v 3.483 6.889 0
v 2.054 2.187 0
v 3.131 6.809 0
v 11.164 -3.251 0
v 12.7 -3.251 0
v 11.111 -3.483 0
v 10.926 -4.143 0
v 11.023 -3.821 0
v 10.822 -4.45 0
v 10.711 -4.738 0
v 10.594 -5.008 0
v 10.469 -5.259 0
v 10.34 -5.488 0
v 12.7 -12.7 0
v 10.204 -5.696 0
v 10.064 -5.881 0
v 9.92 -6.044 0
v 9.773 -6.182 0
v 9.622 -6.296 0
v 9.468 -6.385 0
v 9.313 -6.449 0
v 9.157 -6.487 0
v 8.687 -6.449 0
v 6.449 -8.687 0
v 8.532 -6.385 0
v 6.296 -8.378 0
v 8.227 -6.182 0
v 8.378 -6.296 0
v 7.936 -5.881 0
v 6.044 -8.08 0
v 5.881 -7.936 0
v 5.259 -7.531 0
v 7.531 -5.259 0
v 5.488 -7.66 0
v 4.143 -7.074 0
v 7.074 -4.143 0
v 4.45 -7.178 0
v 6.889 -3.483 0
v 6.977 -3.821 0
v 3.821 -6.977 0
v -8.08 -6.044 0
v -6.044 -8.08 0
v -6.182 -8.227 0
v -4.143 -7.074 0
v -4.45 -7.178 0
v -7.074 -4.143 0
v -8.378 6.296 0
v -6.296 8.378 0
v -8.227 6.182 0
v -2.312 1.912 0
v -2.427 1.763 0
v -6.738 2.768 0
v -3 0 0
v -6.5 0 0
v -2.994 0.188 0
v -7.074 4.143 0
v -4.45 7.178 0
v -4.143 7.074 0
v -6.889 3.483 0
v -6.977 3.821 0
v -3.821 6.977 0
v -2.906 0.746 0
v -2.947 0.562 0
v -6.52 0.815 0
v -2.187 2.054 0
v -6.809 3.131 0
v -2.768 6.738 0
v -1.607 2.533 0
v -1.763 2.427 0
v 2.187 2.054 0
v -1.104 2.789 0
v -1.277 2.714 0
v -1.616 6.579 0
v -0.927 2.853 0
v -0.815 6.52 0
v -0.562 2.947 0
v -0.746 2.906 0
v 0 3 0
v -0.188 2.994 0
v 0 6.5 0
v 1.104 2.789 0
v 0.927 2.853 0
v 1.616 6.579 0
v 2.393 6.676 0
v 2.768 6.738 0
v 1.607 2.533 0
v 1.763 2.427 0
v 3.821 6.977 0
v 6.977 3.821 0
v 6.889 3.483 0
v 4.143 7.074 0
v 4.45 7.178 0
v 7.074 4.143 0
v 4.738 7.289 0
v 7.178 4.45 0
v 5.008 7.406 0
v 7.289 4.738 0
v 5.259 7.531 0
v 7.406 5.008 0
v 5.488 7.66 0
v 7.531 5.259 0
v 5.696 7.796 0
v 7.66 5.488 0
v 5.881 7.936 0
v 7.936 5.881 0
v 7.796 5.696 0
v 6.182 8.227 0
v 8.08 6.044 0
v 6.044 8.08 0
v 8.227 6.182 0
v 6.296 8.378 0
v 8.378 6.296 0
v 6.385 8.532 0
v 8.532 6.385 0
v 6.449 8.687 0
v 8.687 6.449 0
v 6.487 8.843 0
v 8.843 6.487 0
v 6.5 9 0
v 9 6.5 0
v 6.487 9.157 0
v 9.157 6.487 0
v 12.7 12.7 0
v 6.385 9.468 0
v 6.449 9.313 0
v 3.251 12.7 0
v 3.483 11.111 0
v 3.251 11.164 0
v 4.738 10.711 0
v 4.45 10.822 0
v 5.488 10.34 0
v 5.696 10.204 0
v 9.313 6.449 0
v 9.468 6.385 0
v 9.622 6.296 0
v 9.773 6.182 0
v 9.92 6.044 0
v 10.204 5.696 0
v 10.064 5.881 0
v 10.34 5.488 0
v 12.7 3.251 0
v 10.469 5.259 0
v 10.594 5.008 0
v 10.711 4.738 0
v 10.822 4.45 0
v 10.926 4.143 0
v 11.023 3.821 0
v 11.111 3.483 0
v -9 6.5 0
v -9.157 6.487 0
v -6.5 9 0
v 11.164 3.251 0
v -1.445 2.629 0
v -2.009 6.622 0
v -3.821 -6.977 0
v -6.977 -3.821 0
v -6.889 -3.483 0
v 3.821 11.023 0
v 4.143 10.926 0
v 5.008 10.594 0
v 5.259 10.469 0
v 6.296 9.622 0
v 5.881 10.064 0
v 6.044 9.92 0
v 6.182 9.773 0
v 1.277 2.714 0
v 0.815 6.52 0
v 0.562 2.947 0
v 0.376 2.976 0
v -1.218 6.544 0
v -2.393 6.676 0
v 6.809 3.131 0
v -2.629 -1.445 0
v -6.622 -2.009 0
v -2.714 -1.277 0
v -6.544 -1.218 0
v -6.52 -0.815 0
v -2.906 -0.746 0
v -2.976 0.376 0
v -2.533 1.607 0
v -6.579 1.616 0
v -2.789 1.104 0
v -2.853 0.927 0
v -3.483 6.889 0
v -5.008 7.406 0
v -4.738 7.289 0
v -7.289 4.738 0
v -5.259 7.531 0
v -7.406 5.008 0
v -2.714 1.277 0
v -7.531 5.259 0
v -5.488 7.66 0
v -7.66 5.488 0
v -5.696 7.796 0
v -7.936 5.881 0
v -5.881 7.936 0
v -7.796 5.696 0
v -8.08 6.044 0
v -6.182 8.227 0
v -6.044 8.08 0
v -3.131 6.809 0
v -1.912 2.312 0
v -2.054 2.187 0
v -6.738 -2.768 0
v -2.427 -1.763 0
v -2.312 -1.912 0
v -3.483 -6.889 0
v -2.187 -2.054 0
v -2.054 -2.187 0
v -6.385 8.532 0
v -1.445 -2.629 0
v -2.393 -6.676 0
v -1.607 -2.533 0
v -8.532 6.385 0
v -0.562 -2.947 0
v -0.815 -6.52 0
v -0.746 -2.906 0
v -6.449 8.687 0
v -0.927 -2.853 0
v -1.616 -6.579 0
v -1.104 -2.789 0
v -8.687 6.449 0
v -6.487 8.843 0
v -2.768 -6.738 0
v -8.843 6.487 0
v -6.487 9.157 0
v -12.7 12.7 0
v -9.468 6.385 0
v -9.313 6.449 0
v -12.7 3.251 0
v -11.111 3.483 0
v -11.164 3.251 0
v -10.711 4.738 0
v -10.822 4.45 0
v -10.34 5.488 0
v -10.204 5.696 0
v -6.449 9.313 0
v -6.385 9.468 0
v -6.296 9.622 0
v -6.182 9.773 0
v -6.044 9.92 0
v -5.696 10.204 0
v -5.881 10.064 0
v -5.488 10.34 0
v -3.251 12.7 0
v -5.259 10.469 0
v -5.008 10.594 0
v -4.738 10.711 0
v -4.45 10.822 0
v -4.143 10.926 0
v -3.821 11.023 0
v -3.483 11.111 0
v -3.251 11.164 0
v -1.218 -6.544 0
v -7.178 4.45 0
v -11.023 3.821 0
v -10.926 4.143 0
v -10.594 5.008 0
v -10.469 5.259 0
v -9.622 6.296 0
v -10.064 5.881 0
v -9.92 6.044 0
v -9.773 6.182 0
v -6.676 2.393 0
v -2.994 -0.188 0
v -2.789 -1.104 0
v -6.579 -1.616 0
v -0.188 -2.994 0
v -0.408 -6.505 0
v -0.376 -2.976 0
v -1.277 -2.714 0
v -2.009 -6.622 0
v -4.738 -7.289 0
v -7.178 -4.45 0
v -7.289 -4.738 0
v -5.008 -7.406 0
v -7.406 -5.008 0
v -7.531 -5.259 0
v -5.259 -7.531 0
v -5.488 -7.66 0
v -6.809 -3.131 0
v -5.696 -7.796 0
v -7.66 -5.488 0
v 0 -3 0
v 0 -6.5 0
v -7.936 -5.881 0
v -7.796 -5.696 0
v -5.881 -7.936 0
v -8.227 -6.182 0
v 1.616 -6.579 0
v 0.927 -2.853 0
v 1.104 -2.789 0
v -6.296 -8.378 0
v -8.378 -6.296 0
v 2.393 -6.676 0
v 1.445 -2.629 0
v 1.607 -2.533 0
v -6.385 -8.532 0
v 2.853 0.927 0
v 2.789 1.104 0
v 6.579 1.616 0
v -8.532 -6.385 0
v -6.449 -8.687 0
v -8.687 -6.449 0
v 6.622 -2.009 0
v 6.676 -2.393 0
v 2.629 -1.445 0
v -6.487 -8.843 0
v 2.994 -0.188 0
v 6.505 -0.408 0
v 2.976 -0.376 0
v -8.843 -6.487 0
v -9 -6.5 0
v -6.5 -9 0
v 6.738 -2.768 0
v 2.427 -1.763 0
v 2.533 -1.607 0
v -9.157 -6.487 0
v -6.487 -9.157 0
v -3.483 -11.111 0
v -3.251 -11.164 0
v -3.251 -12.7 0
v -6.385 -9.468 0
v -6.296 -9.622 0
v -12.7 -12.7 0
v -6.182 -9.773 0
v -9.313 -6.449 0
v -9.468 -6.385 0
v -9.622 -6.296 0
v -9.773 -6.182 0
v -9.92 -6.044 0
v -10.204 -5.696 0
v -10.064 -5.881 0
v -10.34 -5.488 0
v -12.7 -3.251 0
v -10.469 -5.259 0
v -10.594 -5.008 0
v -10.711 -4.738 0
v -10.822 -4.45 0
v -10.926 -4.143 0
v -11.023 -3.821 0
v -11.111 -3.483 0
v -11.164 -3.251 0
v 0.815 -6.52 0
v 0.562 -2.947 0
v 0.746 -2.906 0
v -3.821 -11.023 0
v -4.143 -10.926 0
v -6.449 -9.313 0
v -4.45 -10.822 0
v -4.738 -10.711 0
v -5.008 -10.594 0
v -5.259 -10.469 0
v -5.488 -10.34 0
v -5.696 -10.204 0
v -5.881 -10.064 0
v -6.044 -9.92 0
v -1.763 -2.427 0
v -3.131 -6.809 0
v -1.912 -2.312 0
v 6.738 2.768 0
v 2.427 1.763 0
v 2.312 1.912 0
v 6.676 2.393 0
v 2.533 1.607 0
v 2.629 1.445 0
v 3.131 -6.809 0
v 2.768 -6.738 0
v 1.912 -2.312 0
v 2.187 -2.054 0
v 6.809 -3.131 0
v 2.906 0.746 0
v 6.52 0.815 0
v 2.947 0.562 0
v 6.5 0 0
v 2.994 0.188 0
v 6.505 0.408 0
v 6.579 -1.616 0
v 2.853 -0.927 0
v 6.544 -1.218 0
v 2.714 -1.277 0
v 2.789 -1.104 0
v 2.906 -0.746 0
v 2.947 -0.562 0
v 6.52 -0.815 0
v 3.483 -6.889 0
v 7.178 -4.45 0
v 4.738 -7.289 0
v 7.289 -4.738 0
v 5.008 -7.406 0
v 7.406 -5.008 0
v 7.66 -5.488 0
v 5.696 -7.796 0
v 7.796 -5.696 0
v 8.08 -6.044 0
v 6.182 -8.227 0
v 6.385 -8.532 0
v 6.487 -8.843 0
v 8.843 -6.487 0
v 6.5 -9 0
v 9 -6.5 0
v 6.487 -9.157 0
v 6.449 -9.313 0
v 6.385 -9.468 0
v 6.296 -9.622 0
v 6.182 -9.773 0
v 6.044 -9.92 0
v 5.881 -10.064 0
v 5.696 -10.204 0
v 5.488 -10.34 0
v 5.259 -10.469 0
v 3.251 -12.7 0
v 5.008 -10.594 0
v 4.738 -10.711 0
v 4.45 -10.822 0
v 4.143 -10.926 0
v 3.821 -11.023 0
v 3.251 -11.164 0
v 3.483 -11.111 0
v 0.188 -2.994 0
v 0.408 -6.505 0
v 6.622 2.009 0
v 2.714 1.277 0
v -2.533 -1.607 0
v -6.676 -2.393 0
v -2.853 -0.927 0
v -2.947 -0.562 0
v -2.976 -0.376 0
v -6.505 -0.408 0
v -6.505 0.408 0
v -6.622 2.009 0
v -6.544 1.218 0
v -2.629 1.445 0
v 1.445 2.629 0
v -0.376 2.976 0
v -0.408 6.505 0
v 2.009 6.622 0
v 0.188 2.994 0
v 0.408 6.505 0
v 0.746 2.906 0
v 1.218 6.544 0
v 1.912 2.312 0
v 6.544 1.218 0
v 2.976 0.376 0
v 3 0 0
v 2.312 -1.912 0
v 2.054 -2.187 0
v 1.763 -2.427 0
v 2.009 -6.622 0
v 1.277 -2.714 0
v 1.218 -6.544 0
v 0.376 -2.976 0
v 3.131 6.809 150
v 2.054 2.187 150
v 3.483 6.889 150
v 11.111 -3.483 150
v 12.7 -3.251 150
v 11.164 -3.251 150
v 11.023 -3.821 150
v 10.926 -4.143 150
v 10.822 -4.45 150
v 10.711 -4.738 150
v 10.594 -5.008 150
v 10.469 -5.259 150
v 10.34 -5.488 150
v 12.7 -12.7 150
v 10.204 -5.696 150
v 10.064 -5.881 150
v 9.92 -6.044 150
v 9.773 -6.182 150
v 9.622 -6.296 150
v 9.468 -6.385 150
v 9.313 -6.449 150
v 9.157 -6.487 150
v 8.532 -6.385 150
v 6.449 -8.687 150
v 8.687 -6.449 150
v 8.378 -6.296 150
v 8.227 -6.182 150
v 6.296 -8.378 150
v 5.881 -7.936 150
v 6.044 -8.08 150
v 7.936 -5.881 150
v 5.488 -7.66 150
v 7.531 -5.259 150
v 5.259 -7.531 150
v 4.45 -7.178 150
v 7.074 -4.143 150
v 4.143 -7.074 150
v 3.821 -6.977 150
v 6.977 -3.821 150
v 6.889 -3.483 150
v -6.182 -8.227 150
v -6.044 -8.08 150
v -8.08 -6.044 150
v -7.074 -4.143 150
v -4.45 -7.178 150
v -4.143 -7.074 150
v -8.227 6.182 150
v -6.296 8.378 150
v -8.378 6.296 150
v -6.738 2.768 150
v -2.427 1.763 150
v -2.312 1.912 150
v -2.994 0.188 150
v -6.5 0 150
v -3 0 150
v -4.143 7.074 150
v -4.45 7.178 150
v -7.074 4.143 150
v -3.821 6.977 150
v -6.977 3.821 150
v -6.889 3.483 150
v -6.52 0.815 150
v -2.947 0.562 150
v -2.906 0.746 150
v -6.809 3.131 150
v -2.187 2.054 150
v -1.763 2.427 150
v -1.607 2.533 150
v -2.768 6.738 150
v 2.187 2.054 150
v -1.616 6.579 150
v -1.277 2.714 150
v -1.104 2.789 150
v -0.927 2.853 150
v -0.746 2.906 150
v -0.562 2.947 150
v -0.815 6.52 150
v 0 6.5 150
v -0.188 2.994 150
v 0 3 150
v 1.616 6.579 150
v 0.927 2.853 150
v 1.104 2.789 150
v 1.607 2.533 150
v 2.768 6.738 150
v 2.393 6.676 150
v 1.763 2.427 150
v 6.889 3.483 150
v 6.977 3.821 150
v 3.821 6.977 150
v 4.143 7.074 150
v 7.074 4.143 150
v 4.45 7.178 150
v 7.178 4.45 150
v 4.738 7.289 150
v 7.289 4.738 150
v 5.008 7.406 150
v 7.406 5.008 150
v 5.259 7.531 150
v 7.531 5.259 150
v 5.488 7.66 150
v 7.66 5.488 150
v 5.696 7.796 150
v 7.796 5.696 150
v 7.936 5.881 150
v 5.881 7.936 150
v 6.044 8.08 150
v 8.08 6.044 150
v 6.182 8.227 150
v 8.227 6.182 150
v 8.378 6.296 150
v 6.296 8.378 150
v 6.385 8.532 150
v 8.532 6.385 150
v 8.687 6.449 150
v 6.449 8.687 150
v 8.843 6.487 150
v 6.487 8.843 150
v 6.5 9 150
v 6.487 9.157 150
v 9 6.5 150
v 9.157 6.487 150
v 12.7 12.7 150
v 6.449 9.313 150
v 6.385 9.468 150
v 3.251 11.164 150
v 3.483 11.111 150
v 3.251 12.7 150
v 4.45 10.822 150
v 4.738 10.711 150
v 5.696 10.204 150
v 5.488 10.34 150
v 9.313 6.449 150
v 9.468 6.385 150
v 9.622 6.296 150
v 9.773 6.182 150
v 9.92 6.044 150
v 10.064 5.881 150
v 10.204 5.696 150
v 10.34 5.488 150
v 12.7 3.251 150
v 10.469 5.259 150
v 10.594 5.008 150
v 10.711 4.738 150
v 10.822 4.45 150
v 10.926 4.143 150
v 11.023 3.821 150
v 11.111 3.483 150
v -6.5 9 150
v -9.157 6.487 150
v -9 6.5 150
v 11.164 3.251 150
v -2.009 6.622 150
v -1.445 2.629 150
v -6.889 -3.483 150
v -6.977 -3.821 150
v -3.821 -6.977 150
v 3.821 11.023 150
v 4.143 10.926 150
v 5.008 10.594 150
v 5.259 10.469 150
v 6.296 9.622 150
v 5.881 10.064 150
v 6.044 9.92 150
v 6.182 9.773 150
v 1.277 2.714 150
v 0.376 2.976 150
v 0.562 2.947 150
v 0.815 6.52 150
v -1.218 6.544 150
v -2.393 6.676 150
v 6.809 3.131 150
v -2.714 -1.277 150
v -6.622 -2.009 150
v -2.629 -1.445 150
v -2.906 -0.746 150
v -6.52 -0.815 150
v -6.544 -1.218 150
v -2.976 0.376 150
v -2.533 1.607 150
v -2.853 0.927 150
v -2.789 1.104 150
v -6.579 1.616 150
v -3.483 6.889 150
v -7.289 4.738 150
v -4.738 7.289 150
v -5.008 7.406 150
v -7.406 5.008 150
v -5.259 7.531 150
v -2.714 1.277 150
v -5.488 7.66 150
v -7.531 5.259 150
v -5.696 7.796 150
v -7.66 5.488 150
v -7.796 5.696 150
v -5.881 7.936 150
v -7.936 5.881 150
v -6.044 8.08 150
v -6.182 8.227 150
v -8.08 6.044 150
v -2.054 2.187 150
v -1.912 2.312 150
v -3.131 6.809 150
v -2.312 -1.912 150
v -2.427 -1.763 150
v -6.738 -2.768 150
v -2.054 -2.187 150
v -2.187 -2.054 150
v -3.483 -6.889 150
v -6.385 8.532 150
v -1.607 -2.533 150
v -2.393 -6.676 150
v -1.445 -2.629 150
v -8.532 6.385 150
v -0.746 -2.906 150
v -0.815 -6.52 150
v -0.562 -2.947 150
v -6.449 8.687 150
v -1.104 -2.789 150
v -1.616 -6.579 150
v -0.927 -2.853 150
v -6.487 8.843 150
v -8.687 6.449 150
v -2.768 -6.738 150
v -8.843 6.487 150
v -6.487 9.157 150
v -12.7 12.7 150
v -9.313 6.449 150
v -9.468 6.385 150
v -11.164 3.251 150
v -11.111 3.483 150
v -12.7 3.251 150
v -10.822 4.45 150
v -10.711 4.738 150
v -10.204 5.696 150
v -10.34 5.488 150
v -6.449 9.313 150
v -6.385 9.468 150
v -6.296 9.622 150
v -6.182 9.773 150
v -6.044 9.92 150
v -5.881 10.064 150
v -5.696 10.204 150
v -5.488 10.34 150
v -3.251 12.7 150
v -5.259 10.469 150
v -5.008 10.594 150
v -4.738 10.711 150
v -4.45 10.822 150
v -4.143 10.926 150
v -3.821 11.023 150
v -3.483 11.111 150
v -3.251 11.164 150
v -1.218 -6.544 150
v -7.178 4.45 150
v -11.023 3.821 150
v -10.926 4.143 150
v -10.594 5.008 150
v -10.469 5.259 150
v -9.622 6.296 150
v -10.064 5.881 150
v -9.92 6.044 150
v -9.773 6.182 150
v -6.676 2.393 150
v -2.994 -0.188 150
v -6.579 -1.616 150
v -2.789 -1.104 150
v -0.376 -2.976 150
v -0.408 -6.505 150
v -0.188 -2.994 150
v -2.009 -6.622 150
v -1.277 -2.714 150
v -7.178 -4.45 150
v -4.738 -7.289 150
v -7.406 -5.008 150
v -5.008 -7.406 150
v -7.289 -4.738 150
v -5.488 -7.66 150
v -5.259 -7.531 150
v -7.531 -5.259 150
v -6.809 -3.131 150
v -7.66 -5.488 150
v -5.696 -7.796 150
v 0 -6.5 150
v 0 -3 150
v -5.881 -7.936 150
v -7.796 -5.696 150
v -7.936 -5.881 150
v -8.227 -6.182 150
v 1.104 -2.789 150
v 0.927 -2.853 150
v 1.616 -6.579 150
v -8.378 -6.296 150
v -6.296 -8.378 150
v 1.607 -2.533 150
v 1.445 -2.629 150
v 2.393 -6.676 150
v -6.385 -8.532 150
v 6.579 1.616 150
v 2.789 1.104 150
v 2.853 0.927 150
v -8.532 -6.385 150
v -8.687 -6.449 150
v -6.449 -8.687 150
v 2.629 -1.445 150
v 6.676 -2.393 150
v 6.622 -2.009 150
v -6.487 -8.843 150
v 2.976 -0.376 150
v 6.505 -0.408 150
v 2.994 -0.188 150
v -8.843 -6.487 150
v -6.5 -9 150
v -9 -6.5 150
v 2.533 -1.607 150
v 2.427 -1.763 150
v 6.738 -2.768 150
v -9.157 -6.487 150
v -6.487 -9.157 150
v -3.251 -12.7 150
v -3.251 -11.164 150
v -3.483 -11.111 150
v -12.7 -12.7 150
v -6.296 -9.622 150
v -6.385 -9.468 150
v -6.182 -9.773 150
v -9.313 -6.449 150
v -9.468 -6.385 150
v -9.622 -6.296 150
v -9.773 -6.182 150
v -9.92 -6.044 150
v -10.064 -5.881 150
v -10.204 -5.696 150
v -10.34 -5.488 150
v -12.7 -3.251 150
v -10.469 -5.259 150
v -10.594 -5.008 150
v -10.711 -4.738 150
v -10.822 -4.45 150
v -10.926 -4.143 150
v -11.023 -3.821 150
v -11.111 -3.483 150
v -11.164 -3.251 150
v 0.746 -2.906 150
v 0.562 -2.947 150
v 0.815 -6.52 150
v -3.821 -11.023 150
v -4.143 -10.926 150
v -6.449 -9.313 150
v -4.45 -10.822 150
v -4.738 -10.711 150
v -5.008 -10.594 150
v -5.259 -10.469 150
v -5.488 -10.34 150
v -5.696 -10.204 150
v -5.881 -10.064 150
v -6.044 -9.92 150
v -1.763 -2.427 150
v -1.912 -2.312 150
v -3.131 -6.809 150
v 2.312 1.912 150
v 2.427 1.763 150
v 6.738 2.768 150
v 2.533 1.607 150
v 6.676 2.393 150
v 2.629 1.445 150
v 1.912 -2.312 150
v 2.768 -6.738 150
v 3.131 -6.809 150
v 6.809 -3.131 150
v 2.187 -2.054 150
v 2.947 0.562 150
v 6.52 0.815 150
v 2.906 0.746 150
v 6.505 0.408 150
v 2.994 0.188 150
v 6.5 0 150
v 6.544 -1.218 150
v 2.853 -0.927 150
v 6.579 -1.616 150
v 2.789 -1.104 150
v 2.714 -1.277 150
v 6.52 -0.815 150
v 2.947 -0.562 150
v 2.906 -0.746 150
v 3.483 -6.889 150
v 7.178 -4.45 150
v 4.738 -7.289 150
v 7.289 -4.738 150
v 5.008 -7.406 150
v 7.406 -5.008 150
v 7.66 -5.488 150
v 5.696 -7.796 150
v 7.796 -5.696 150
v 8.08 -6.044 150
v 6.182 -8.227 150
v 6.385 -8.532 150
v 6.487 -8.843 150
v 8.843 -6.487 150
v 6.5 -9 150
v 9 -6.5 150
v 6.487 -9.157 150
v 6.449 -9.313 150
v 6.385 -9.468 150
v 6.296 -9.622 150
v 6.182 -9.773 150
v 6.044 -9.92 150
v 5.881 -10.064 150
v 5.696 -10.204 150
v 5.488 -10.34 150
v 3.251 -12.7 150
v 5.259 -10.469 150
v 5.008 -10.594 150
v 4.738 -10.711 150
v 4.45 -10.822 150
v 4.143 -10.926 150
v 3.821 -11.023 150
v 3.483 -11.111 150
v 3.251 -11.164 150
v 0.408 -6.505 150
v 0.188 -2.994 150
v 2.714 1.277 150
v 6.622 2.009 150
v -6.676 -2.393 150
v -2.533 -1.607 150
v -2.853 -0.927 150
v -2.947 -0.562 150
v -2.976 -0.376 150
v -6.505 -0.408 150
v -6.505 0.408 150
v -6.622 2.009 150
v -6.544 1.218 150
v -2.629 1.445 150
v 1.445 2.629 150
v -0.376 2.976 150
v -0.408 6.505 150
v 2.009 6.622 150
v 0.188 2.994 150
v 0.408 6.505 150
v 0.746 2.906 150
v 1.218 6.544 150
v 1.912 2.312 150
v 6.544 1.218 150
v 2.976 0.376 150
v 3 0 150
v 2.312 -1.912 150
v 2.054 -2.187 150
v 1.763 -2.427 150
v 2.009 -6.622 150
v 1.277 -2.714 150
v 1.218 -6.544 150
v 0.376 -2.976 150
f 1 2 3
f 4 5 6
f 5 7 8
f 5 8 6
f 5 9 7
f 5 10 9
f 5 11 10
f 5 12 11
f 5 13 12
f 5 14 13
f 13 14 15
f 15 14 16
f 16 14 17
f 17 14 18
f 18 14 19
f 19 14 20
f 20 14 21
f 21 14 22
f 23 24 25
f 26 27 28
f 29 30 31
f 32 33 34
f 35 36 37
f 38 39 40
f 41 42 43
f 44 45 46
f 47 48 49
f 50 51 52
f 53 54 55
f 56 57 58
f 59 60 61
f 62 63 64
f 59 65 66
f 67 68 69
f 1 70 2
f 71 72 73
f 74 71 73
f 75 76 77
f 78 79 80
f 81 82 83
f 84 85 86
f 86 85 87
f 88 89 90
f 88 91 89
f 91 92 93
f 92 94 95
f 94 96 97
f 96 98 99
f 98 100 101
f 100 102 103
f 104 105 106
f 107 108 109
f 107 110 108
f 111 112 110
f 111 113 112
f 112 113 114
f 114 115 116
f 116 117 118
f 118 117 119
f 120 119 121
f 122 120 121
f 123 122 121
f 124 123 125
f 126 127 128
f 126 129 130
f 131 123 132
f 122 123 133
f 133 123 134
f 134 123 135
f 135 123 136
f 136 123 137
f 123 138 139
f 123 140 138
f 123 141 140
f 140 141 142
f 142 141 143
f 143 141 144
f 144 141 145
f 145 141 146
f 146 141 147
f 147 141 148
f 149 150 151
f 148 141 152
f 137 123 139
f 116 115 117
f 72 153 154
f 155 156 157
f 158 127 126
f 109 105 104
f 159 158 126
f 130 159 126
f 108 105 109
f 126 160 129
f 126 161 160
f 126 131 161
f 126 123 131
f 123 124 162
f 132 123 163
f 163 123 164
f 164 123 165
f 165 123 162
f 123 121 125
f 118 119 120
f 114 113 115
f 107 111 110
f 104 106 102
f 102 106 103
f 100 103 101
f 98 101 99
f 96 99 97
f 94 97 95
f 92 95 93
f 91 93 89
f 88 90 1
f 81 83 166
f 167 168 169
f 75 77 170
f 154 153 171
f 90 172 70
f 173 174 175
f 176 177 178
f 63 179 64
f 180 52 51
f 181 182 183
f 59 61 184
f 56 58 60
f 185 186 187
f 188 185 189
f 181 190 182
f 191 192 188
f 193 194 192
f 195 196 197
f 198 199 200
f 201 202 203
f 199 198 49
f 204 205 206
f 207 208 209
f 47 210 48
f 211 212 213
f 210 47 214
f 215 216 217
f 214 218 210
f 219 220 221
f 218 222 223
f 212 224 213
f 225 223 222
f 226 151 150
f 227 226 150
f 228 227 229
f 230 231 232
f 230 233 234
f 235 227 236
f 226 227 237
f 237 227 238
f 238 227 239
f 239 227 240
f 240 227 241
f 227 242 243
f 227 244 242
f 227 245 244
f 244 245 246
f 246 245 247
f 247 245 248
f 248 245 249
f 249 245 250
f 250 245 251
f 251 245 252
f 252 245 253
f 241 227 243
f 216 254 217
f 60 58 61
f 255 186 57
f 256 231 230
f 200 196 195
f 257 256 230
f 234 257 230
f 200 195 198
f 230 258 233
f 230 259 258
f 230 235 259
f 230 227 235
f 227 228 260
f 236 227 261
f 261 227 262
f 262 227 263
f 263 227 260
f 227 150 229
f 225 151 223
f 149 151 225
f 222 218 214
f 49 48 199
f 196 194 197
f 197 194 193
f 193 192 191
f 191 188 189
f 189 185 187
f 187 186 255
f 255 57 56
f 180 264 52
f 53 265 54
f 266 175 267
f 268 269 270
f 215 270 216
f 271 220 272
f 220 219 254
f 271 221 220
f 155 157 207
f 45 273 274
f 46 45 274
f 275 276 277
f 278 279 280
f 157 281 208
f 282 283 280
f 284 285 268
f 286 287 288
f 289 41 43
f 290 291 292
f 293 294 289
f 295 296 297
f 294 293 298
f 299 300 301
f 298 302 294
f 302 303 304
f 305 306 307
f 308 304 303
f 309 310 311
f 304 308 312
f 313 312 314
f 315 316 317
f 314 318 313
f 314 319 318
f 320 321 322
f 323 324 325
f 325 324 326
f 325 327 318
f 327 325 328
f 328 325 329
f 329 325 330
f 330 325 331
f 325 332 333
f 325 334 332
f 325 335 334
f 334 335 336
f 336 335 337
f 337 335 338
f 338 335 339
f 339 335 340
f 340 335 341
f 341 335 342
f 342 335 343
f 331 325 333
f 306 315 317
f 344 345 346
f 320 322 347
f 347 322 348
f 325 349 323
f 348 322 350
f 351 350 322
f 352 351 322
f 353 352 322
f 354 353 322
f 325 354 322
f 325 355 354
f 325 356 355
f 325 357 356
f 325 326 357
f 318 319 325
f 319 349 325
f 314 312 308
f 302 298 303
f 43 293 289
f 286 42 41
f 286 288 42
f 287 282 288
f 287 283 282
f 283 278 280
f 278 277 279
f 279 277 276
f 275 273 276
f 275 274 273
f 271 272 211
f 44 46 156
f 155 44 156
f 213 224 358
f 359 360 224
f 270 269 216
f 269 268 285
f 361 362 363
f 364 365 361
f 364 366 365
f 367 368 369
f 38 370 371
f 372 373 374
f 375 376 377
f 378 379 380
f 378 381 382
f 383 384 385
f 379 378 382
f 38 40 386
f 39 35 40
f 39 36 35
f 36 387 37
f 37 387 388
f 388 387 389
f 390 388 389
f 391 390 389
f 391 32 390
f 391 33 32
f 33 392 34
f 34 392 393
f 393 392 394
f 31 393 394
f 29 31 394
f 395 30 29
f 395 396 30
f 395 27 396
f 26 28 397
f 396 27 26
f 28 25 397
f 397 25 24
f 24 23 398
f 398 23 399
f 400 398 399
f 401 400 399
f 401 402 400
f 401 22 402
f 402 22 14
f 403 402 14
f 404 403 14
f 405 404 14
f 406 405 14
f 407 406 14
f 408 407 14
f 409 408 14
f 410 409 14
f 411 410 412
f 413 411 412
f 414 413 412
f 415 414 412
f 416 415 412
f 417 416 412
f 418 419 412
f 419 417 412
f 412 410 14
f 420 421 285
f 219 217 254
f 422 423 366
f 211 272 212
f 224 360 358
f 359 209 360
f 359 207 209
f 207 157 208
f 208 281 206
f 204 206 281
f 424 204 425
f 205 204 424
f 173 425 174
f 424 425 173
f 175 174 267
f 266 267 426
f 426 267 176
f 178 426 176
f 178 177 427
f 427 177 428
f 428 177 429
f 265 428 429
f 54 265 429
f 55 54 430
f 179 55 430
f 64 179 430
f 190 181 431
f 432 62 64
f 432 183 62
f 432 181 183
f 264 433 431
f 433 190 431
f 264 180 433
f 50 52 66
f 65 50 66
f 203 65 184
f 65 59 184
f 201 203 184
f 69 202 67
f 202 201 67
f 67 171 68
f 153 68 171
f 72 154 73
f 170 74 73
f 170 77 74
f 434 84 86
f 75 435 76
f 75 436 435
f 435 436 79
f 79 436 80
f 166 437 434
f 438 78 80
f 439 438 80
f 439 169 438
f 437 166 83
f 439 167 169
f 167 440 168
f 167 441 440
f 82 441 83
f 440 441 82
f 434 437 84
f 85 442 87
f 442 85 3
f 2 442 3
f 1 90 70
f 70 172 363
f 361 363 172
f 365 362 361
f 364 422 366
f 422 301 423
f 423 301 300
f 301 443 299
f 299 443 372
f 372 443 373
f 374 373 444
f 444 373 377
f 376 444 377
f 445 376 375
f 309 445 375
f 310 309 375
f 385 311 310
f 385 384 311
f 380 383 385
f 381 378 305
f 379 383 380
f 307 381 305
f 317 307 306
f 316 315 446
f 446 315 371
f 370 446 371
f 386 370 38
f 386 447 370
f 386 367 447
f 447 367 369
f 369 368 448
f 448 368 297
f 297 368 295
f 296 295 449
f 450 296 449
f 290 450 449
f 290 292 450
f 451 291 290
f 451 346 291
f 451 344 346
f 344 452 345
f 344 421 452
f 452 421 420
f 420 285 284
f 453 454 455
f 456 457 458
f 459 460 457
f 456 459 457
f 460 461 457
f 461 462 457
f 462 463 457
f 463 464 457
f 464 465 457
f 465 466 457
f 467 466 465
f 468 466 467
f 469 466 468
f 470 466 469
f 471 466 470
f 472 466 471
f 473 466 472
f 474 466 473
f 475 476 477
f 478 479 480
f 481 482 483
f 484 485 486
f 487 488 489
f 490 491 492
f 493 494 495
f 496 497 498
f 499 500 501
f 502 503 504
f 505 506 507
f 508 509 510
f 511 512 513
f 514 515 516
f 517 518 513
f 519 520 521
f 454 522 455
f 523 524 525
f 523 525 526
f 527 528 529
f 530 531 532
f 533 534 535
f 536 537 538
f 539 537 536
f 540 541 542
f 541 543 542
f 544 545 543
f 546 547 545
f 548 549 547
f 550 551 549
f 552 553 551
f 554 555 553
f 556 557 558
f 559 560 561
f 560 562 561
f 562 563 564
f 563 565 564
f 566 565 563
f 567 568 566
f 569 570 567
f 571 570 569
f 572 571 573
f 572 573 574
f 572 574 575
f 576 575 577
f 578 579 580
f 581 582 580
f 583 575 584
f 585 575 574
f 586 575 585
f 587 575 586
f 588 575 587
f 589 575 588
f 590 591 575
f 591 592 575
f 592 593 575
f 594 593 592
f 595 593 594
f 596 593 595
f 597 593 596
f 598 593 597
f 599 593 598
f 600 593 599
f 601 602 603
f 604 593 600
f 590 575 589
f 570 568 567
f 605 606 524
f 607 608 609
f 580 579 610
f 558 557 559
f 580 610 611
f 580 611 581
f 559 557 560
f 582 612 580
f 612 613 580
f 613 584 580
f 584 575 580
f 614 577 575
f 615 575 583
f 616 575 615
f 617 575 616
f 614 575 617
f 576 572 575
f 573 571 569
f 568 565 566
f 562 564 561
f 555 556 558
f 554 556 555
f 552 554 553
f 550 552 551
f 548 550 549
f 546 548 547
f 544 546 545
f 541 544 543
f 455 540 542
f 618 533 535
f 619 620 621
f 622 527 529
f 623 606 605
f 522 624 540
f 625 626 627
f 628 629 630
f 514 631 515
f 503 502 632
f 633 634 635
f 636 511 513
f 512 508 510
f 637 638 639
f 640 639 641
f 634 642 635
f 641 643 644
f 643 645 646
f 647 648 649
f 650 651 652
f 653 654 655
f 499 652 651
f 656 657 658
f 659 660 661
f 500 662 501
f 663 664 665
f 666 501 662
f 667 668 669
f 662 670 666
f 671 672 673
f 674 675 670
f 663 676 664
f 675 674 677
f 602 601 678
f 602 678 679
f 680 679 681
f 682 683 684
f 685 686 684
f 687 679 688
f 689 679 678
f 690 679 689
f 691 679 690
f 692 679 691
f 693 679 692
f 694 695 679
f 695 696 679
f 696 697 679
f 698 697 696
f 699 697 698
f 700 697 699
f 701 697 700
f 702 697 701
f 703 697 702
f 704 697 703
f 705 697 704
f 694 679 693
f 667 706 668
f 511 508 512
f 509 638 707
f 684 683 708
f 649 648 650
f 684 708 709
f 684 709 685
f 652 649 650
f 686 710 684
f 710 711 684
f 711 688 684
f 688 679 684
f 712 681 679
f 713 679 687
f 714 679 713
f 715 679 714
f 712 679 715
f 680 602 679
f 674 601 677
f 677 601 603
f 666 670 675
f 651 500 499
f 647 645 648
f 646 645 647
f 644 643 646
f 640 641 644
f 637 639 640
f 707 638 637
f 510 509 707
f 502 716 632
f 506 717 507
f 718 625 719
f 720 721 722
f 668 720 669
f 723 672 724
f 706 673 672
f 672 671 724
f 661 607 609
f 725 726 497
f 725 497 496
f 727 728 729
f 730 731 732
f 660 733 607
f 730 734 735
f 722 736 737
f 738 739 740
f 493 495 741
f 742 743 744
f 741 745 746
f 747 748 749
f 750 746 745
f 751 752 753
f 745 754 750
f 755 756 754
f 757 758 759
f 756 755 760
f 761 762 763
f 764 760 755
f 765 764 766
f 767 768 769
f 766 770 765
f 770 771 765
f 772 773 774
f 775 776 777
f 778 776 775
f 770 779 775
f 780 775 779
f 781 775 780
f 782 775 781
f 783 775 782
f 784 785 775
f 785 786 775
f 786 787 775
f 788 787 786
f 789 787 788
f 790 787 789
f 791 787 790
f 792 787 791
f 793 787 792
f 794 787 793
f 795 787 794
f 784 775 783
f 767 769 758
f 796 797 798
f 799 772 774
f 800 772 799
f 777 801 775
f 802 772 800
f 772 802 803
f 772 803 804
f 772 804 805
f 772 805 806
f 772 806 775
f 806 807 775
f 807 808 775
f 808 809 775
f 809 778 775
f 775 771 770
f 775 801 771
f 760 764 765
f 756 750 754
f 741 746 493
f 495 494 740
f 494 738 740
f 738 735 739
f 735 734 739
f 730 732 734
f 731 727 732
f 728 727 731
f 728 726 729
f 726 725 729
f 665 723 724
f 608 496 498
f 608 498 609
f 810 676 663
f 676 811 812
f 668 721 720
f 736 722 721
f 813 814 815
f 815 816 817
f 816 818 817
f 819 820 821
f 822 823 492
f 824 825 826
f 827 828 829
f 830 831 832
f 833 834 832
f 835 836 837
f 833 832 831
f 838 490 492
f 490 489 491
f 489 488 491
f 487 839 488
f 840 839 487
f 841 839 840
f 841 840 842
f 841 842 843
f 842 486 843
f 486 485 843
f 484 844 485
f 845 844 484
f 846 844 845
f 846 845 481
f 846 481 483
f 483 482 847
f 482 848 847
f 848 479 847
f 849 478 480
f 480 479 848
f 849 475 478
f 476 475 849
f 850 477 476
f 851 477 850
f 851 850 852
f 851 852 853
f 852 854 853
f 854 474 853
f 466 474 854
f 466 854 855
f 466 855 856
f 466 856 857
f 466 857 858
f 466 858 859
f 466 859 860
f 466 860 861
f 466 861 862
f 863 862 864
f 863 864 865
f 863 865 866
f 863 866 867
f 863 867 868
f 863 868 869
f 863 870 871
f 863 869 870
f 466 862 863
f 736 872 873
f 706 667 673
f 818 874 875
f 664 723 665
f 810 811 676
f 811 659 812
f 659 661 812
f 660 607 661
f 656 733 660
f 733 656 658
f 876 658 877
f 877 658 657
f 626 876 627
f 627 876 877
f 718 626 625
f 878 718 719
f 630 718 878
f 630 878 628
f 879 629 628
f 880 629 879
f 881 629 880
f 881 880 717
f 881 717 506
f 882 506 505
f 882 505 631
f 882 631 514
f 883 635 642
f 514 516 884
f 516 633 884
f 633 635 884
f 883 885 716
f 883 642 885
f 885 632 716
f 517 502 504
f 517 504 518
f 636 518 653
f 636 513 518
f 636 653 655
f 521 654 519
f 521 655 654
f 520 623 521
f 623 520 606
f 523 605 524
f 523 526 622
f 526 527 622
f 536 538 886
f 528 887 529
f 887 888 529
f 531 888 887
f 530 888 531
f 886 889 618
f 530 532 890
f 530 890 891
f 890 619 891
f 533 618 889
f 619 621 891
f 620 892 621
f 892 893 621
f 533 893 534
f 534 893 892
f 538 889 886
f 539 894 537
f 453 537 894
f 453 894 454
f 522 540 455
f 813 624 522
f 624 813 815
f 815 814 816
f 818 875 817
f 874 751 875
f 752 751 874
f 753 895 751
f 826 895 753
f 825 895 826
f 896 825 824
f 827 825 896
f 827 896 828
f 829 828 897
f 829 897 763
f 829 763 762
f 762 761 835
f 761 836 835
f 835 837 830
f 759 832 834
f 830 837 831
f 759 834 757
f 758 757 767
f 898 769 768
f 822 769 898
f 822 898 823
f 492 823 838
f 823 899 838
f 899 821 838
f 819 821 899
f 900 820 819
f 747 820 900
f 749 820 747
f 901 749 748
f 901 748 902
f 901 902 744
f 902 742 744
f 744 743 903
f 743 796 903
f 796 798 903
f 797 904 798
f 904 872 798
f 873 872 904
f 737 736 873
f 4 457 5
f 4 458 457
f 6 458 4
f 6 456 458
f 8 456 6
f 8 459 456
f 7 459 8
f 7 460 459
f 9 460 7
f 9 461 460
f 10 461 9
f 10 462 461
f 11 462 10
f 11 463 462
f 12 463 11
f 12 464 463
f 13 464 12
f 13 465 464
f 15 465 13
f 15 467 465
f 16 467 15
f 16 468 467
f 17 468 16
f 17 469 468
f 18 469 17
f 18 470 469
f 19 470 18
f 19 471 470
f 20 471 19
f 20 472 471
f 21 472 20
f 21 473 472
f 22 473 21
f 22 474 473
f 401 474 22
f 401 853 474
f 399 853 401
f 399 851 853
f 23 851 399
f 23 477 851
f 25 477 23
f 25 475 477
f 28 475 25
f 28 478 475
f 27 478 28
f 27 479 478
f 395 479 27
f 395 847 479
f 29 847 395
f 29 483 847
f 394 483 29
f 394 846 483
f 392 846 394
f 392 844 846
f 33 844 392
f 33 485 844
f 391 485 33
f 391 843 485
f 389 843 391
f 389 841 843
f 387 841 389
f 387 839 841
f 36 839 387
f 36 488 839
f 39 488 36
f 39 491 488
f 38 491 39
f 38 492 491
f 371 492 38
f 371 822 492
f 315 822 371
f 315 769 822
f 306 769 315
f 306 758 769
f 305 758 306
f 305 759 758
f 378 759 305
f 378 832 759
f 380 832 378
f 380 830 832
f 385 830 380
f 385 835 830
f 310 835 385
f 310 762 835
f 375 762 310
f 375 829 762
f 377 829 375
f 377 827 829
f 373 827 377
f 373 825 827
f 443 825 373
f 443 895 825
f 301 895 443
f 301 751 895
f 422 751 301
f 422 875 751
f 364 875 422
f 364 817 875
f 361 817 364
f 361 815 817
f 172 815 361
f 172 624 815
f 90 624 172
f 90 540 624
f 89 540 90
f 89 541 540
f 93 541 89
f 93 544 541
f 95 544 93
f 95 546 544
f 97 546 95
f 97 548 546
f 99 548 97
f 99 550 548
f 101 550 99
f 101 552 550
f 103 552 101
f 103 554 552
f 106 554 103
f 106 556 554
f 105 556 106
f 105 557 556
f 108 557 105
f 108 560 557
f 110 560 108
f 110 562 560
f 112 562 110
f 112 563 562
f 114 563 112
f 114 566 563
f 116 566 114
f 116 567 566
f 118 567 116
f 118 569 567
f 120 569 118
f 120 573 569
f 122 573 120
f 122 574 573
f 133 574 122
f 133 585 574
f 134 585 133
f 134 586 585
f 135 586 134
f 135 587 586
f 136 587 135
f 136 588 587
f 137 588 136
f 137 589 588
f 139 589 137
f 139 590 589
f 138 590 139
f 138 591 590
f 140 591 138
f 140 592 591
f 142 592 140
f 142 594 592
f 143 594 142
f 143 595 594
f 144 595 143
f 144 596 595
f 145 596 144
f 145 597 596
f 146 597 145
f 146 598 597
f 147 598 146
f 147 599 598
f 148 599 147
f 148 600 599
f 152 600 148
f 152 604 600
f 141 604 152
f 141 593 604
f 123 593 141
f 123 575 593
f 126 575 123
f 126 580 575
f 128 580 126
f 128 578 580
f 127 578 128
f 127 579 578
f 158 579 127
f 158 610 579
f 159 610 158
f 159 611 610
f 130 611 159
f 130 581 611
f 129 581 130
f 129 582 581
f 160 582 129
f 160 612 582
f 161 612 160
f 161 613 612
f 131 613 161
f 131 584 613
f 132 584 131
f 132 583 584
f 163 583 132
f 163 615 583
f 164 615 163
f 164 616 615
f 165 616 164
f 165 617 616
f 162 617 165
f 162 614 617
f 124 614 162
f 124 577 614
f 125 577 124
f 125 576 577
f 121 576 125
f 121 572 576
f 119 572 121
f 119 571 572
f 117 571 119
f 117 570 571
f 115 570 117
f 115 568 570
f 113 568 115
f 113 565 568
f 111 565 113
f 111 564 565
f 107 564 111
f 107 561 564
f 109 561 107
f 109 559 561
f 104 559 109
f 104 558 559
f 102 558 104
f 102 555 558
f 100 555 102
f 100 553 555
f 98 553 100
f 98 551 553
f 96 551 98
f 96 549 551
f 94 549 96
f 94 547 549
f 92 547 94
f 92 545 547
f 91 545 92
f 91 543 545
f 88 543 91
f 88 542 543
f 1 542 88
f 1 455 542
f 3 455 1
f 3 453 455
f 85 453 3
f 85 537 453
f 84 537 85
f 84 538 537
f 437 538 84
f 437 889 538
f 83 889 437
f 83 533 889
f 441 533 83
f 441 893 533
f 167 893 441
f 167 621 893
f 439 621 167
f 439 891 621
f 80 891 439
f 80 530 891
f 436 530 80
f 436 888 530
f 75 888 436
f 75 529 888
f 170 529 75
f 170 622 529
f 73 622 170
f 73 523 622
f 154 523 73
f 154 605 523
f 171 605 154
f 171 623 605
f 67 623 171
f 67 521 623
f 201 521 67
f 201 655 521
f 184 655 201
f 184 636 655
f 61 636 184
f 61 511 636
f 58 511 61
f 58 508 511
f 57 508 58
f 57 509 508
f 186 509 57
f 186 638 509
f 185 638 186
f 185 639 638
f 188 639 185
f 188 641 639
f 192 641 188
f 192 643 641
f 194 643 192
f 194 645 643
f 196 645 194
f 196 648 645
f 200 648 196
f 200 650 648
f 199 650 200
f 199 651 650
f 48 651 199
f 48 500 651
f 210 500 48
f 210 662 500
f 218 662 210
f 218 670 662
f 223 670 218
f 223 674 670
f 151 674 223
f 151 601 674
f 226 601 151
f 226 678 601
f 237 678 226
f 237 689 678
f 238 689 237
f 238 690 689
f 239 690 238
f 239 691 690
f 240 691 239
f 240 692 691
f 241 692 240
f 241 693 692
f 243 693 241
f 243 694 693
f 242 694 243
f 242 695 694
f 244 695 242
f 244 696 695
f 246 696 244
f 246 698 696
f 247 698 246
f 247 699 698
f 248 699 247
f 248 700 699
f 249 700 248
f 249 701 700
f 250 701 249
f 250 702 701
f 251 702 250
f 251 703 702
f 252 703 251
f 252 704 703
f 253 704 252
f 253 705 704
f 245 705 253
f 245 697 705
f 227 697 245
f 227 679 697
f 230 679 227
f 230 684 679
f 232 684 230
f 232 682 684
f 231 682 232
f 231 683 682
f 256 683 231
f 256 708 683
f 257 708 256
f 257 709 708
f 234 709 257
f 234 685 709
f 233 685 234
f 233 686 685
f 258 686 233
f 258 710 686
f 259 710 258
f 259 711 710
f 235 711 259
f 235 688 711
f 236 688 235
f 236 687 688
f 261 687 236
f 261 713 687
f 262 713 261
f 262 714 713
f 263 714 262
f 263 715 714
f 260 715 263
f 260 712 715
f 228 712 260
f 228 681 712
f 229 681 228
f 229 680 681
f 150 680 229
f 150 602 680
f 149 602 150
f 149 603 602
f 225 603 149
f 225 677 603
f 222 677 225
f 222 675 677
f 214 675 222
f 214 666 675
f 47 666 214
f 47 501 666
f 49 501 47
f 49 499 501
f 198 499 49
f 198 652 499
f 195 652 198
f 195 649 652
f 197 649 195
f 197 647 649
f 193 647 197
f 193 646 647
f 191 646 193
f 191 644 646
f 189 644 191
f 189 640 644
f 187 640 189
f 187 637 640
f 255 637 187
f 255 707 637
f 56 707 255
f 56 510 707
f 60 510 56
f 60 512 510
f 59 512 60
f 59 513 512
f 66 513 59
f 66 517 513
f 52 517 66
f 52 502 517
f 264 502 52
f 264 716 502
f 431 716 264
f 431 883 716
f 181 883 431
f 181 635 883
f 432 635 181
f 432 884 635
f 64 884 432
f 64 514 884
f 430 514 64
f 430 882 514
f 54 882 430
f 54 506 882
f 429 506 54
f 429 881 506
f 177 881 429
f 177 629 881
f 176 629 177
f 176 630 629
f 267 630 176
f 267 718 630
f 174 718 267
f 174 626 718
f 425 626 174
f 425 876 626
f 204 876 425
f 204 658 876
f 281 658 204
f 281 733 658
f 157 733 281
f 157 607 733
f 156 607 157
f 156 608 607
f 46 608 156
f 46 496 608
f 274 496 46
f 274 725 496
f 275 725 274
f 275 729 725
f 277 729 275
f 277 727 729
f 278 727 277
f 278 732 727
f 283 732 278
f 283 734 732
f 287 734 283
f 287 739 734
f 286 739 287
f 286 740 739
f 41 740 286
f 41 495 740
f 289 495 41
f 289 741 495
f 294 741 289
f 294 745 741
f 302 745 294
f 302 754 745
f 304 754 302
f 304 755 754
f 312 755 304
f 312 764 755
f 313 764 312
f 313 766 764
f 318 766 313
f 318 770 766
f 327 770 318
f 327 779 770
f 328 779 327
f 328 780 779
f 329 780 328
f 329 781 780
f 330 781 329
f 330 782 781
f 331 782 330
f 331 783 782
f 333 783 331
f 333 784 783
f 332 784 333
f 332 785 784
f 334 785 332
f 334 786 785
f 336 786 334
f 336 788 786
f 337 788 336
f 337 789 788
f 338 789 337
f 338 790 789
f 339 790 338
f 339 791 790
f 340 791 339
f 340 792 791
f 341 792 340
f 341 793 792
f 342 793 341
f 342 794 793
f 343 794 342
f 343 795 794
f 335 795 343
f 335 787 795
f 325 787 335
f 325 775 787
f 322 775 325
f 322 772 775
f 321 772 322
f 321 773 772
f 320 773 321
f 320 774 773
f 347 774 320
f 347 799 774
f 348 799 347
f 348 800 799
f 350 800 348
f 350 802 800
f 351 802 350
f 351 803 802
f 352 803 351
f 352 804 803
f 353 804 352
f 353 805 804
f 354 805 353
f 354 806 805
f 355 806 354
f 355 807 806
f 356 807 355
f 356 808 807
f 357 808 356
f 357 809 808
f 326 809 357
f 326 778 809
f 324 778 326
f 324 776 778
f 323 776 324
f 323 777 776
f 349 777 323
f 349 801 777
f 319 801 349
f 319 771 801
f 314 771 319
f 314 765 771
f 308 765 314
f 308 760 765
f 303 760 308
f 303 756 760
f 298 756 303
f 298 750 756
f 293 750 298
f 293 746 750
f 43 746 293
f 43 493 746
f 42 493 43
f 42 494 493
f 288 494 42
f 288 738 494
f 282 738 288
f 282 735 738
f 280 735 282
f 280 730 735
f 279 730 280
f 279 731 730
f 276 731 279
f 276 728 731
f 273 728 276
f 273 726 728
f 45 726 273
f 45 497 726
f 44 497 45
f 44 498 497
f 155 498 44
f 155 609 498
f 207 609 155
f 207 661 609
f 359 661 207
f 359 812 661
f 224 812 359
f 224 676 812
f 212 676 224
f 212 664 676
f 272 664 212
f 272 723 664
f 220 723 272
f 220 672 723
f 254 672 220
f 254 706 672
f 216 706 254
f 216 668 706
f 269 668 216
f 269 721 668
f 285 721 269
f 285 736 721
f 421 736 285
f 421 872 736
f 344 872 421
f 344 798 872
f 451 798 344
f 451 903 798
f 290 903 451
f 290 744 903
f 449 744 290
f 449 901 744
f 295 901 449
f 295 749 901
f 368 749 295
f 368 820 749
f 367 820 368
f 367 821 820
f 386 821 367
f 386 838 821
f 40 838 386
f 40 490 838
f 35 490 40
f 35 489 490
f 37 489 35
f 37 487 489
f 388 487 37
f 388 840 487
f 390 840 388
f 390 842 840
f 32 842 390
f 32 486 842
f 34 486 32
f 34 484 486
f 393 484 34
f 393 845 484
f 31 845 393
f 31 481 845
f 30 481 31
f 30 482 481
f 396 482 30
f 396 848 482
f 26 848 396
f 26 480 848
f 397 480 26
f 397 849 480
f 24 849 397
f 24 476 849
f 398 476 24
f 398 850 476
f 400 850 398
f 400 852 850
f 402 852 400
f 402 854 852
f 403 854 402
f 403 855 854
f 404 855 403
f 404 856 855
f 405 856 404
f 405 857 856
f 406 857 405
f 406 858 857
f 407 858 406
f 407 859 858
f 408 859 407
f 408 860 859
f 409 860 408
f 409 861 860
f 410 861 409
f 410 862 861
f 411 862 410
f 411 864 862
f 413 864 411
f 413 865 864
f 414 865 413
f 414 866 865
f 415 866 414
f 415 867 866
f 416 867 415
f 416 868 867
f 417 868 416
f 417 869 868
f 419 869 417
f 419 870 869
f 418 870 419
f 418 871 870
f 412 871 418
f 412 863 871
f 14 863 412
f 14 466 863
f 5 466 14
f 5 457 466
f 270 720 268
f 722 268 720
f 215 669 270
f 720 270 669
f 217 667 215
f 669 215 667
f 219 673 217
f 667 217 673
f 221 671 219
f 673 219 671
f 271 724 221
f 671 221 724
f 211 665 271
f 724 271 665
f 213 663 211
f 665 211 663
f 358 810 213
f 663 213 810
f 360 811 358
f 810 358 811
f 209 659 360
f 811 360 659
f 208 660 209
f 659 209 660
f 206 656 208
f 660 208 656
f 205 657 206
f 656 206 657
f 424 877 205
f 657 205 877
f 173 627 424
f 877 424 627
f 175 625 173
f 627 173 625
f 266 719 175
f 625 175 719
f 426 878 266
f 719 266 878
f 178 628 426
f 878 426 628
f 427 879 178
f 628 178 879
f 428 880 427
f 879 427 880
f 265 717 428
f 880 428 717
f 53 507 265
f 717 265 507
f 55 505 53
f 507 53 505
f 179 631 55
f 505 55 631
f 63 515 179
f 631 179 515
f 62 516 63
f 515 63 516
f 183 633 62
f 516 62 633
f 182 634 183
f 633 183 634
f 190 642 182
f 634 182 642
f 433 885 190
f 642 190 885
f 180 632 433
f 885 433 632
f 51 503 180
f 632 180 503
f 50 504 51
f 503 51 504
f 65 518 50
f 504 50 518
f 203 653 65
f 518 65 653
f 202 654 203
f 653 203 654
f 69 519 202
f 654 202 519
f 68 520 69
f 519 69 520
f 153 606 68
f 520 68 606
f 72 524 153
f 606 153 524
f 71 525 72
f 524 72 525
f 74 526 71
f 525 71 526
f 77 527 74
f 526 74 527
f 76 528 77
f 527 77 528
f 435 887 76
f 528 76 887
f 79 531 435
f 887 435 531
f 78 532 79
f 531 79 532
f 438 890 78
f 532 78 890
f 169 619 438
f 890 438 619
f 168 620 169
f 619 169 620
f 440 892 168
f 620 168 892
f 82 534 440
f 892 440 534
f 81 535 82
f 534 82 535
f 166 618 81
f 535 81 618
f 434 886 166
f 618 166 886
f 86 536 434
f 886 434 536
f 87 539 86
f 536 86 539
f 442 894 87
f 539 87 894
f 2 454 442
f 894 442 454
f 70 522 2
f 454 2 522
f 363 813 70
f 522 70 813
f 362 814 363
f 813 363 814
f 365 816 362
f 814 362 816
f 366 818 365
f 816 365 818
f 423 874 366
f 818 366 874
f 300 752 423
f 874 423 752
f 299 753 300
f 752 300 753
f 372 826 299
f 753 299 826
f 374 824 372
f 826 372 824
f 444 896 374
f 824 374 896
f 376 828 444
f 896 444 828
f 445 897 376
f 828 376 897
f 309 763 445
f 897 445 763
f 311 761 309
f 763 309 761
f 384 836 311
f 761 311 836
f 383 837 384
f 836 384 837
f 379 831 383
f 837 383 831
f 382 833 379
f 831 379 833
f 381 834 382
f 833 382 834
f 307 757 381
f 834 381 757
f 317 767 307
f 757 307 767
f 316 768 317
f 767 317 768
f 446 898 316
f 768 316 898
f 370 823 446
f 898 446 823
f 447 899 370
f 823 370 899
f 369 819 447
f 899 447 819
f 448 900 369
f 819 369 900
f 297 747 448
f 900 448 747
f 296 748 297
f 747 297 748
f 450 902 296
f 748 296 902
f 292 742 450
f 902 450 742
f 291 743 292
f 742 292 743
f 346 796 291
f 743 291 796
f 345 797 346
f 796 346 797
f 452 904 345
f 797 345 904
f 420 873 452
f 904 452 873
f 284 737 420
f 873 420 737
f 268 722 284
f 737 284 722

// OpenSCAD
$fn=100;
inch = 25.4;

module Extrusion_8020(length)
{
    color("silver")
    linear_extrude(length)
    difference()
    {
    translate([-0.5*inch,-0.5*inch])
    square(1.0 * inch);    
    notch = 0.256*inch;
        union()
        {
            for (a = [0,90,180,270])
            {
                rotate([0,0,a])
                {
                    translate([-notch/2.0,7])
                      square([notch,0.4*inch]);
                    translate([0,9])
                    scale([1.3,0.5])
                    circle(5);
                }
            }
            circle(3);
        }
    }
}

Extrusion_8020(150);
